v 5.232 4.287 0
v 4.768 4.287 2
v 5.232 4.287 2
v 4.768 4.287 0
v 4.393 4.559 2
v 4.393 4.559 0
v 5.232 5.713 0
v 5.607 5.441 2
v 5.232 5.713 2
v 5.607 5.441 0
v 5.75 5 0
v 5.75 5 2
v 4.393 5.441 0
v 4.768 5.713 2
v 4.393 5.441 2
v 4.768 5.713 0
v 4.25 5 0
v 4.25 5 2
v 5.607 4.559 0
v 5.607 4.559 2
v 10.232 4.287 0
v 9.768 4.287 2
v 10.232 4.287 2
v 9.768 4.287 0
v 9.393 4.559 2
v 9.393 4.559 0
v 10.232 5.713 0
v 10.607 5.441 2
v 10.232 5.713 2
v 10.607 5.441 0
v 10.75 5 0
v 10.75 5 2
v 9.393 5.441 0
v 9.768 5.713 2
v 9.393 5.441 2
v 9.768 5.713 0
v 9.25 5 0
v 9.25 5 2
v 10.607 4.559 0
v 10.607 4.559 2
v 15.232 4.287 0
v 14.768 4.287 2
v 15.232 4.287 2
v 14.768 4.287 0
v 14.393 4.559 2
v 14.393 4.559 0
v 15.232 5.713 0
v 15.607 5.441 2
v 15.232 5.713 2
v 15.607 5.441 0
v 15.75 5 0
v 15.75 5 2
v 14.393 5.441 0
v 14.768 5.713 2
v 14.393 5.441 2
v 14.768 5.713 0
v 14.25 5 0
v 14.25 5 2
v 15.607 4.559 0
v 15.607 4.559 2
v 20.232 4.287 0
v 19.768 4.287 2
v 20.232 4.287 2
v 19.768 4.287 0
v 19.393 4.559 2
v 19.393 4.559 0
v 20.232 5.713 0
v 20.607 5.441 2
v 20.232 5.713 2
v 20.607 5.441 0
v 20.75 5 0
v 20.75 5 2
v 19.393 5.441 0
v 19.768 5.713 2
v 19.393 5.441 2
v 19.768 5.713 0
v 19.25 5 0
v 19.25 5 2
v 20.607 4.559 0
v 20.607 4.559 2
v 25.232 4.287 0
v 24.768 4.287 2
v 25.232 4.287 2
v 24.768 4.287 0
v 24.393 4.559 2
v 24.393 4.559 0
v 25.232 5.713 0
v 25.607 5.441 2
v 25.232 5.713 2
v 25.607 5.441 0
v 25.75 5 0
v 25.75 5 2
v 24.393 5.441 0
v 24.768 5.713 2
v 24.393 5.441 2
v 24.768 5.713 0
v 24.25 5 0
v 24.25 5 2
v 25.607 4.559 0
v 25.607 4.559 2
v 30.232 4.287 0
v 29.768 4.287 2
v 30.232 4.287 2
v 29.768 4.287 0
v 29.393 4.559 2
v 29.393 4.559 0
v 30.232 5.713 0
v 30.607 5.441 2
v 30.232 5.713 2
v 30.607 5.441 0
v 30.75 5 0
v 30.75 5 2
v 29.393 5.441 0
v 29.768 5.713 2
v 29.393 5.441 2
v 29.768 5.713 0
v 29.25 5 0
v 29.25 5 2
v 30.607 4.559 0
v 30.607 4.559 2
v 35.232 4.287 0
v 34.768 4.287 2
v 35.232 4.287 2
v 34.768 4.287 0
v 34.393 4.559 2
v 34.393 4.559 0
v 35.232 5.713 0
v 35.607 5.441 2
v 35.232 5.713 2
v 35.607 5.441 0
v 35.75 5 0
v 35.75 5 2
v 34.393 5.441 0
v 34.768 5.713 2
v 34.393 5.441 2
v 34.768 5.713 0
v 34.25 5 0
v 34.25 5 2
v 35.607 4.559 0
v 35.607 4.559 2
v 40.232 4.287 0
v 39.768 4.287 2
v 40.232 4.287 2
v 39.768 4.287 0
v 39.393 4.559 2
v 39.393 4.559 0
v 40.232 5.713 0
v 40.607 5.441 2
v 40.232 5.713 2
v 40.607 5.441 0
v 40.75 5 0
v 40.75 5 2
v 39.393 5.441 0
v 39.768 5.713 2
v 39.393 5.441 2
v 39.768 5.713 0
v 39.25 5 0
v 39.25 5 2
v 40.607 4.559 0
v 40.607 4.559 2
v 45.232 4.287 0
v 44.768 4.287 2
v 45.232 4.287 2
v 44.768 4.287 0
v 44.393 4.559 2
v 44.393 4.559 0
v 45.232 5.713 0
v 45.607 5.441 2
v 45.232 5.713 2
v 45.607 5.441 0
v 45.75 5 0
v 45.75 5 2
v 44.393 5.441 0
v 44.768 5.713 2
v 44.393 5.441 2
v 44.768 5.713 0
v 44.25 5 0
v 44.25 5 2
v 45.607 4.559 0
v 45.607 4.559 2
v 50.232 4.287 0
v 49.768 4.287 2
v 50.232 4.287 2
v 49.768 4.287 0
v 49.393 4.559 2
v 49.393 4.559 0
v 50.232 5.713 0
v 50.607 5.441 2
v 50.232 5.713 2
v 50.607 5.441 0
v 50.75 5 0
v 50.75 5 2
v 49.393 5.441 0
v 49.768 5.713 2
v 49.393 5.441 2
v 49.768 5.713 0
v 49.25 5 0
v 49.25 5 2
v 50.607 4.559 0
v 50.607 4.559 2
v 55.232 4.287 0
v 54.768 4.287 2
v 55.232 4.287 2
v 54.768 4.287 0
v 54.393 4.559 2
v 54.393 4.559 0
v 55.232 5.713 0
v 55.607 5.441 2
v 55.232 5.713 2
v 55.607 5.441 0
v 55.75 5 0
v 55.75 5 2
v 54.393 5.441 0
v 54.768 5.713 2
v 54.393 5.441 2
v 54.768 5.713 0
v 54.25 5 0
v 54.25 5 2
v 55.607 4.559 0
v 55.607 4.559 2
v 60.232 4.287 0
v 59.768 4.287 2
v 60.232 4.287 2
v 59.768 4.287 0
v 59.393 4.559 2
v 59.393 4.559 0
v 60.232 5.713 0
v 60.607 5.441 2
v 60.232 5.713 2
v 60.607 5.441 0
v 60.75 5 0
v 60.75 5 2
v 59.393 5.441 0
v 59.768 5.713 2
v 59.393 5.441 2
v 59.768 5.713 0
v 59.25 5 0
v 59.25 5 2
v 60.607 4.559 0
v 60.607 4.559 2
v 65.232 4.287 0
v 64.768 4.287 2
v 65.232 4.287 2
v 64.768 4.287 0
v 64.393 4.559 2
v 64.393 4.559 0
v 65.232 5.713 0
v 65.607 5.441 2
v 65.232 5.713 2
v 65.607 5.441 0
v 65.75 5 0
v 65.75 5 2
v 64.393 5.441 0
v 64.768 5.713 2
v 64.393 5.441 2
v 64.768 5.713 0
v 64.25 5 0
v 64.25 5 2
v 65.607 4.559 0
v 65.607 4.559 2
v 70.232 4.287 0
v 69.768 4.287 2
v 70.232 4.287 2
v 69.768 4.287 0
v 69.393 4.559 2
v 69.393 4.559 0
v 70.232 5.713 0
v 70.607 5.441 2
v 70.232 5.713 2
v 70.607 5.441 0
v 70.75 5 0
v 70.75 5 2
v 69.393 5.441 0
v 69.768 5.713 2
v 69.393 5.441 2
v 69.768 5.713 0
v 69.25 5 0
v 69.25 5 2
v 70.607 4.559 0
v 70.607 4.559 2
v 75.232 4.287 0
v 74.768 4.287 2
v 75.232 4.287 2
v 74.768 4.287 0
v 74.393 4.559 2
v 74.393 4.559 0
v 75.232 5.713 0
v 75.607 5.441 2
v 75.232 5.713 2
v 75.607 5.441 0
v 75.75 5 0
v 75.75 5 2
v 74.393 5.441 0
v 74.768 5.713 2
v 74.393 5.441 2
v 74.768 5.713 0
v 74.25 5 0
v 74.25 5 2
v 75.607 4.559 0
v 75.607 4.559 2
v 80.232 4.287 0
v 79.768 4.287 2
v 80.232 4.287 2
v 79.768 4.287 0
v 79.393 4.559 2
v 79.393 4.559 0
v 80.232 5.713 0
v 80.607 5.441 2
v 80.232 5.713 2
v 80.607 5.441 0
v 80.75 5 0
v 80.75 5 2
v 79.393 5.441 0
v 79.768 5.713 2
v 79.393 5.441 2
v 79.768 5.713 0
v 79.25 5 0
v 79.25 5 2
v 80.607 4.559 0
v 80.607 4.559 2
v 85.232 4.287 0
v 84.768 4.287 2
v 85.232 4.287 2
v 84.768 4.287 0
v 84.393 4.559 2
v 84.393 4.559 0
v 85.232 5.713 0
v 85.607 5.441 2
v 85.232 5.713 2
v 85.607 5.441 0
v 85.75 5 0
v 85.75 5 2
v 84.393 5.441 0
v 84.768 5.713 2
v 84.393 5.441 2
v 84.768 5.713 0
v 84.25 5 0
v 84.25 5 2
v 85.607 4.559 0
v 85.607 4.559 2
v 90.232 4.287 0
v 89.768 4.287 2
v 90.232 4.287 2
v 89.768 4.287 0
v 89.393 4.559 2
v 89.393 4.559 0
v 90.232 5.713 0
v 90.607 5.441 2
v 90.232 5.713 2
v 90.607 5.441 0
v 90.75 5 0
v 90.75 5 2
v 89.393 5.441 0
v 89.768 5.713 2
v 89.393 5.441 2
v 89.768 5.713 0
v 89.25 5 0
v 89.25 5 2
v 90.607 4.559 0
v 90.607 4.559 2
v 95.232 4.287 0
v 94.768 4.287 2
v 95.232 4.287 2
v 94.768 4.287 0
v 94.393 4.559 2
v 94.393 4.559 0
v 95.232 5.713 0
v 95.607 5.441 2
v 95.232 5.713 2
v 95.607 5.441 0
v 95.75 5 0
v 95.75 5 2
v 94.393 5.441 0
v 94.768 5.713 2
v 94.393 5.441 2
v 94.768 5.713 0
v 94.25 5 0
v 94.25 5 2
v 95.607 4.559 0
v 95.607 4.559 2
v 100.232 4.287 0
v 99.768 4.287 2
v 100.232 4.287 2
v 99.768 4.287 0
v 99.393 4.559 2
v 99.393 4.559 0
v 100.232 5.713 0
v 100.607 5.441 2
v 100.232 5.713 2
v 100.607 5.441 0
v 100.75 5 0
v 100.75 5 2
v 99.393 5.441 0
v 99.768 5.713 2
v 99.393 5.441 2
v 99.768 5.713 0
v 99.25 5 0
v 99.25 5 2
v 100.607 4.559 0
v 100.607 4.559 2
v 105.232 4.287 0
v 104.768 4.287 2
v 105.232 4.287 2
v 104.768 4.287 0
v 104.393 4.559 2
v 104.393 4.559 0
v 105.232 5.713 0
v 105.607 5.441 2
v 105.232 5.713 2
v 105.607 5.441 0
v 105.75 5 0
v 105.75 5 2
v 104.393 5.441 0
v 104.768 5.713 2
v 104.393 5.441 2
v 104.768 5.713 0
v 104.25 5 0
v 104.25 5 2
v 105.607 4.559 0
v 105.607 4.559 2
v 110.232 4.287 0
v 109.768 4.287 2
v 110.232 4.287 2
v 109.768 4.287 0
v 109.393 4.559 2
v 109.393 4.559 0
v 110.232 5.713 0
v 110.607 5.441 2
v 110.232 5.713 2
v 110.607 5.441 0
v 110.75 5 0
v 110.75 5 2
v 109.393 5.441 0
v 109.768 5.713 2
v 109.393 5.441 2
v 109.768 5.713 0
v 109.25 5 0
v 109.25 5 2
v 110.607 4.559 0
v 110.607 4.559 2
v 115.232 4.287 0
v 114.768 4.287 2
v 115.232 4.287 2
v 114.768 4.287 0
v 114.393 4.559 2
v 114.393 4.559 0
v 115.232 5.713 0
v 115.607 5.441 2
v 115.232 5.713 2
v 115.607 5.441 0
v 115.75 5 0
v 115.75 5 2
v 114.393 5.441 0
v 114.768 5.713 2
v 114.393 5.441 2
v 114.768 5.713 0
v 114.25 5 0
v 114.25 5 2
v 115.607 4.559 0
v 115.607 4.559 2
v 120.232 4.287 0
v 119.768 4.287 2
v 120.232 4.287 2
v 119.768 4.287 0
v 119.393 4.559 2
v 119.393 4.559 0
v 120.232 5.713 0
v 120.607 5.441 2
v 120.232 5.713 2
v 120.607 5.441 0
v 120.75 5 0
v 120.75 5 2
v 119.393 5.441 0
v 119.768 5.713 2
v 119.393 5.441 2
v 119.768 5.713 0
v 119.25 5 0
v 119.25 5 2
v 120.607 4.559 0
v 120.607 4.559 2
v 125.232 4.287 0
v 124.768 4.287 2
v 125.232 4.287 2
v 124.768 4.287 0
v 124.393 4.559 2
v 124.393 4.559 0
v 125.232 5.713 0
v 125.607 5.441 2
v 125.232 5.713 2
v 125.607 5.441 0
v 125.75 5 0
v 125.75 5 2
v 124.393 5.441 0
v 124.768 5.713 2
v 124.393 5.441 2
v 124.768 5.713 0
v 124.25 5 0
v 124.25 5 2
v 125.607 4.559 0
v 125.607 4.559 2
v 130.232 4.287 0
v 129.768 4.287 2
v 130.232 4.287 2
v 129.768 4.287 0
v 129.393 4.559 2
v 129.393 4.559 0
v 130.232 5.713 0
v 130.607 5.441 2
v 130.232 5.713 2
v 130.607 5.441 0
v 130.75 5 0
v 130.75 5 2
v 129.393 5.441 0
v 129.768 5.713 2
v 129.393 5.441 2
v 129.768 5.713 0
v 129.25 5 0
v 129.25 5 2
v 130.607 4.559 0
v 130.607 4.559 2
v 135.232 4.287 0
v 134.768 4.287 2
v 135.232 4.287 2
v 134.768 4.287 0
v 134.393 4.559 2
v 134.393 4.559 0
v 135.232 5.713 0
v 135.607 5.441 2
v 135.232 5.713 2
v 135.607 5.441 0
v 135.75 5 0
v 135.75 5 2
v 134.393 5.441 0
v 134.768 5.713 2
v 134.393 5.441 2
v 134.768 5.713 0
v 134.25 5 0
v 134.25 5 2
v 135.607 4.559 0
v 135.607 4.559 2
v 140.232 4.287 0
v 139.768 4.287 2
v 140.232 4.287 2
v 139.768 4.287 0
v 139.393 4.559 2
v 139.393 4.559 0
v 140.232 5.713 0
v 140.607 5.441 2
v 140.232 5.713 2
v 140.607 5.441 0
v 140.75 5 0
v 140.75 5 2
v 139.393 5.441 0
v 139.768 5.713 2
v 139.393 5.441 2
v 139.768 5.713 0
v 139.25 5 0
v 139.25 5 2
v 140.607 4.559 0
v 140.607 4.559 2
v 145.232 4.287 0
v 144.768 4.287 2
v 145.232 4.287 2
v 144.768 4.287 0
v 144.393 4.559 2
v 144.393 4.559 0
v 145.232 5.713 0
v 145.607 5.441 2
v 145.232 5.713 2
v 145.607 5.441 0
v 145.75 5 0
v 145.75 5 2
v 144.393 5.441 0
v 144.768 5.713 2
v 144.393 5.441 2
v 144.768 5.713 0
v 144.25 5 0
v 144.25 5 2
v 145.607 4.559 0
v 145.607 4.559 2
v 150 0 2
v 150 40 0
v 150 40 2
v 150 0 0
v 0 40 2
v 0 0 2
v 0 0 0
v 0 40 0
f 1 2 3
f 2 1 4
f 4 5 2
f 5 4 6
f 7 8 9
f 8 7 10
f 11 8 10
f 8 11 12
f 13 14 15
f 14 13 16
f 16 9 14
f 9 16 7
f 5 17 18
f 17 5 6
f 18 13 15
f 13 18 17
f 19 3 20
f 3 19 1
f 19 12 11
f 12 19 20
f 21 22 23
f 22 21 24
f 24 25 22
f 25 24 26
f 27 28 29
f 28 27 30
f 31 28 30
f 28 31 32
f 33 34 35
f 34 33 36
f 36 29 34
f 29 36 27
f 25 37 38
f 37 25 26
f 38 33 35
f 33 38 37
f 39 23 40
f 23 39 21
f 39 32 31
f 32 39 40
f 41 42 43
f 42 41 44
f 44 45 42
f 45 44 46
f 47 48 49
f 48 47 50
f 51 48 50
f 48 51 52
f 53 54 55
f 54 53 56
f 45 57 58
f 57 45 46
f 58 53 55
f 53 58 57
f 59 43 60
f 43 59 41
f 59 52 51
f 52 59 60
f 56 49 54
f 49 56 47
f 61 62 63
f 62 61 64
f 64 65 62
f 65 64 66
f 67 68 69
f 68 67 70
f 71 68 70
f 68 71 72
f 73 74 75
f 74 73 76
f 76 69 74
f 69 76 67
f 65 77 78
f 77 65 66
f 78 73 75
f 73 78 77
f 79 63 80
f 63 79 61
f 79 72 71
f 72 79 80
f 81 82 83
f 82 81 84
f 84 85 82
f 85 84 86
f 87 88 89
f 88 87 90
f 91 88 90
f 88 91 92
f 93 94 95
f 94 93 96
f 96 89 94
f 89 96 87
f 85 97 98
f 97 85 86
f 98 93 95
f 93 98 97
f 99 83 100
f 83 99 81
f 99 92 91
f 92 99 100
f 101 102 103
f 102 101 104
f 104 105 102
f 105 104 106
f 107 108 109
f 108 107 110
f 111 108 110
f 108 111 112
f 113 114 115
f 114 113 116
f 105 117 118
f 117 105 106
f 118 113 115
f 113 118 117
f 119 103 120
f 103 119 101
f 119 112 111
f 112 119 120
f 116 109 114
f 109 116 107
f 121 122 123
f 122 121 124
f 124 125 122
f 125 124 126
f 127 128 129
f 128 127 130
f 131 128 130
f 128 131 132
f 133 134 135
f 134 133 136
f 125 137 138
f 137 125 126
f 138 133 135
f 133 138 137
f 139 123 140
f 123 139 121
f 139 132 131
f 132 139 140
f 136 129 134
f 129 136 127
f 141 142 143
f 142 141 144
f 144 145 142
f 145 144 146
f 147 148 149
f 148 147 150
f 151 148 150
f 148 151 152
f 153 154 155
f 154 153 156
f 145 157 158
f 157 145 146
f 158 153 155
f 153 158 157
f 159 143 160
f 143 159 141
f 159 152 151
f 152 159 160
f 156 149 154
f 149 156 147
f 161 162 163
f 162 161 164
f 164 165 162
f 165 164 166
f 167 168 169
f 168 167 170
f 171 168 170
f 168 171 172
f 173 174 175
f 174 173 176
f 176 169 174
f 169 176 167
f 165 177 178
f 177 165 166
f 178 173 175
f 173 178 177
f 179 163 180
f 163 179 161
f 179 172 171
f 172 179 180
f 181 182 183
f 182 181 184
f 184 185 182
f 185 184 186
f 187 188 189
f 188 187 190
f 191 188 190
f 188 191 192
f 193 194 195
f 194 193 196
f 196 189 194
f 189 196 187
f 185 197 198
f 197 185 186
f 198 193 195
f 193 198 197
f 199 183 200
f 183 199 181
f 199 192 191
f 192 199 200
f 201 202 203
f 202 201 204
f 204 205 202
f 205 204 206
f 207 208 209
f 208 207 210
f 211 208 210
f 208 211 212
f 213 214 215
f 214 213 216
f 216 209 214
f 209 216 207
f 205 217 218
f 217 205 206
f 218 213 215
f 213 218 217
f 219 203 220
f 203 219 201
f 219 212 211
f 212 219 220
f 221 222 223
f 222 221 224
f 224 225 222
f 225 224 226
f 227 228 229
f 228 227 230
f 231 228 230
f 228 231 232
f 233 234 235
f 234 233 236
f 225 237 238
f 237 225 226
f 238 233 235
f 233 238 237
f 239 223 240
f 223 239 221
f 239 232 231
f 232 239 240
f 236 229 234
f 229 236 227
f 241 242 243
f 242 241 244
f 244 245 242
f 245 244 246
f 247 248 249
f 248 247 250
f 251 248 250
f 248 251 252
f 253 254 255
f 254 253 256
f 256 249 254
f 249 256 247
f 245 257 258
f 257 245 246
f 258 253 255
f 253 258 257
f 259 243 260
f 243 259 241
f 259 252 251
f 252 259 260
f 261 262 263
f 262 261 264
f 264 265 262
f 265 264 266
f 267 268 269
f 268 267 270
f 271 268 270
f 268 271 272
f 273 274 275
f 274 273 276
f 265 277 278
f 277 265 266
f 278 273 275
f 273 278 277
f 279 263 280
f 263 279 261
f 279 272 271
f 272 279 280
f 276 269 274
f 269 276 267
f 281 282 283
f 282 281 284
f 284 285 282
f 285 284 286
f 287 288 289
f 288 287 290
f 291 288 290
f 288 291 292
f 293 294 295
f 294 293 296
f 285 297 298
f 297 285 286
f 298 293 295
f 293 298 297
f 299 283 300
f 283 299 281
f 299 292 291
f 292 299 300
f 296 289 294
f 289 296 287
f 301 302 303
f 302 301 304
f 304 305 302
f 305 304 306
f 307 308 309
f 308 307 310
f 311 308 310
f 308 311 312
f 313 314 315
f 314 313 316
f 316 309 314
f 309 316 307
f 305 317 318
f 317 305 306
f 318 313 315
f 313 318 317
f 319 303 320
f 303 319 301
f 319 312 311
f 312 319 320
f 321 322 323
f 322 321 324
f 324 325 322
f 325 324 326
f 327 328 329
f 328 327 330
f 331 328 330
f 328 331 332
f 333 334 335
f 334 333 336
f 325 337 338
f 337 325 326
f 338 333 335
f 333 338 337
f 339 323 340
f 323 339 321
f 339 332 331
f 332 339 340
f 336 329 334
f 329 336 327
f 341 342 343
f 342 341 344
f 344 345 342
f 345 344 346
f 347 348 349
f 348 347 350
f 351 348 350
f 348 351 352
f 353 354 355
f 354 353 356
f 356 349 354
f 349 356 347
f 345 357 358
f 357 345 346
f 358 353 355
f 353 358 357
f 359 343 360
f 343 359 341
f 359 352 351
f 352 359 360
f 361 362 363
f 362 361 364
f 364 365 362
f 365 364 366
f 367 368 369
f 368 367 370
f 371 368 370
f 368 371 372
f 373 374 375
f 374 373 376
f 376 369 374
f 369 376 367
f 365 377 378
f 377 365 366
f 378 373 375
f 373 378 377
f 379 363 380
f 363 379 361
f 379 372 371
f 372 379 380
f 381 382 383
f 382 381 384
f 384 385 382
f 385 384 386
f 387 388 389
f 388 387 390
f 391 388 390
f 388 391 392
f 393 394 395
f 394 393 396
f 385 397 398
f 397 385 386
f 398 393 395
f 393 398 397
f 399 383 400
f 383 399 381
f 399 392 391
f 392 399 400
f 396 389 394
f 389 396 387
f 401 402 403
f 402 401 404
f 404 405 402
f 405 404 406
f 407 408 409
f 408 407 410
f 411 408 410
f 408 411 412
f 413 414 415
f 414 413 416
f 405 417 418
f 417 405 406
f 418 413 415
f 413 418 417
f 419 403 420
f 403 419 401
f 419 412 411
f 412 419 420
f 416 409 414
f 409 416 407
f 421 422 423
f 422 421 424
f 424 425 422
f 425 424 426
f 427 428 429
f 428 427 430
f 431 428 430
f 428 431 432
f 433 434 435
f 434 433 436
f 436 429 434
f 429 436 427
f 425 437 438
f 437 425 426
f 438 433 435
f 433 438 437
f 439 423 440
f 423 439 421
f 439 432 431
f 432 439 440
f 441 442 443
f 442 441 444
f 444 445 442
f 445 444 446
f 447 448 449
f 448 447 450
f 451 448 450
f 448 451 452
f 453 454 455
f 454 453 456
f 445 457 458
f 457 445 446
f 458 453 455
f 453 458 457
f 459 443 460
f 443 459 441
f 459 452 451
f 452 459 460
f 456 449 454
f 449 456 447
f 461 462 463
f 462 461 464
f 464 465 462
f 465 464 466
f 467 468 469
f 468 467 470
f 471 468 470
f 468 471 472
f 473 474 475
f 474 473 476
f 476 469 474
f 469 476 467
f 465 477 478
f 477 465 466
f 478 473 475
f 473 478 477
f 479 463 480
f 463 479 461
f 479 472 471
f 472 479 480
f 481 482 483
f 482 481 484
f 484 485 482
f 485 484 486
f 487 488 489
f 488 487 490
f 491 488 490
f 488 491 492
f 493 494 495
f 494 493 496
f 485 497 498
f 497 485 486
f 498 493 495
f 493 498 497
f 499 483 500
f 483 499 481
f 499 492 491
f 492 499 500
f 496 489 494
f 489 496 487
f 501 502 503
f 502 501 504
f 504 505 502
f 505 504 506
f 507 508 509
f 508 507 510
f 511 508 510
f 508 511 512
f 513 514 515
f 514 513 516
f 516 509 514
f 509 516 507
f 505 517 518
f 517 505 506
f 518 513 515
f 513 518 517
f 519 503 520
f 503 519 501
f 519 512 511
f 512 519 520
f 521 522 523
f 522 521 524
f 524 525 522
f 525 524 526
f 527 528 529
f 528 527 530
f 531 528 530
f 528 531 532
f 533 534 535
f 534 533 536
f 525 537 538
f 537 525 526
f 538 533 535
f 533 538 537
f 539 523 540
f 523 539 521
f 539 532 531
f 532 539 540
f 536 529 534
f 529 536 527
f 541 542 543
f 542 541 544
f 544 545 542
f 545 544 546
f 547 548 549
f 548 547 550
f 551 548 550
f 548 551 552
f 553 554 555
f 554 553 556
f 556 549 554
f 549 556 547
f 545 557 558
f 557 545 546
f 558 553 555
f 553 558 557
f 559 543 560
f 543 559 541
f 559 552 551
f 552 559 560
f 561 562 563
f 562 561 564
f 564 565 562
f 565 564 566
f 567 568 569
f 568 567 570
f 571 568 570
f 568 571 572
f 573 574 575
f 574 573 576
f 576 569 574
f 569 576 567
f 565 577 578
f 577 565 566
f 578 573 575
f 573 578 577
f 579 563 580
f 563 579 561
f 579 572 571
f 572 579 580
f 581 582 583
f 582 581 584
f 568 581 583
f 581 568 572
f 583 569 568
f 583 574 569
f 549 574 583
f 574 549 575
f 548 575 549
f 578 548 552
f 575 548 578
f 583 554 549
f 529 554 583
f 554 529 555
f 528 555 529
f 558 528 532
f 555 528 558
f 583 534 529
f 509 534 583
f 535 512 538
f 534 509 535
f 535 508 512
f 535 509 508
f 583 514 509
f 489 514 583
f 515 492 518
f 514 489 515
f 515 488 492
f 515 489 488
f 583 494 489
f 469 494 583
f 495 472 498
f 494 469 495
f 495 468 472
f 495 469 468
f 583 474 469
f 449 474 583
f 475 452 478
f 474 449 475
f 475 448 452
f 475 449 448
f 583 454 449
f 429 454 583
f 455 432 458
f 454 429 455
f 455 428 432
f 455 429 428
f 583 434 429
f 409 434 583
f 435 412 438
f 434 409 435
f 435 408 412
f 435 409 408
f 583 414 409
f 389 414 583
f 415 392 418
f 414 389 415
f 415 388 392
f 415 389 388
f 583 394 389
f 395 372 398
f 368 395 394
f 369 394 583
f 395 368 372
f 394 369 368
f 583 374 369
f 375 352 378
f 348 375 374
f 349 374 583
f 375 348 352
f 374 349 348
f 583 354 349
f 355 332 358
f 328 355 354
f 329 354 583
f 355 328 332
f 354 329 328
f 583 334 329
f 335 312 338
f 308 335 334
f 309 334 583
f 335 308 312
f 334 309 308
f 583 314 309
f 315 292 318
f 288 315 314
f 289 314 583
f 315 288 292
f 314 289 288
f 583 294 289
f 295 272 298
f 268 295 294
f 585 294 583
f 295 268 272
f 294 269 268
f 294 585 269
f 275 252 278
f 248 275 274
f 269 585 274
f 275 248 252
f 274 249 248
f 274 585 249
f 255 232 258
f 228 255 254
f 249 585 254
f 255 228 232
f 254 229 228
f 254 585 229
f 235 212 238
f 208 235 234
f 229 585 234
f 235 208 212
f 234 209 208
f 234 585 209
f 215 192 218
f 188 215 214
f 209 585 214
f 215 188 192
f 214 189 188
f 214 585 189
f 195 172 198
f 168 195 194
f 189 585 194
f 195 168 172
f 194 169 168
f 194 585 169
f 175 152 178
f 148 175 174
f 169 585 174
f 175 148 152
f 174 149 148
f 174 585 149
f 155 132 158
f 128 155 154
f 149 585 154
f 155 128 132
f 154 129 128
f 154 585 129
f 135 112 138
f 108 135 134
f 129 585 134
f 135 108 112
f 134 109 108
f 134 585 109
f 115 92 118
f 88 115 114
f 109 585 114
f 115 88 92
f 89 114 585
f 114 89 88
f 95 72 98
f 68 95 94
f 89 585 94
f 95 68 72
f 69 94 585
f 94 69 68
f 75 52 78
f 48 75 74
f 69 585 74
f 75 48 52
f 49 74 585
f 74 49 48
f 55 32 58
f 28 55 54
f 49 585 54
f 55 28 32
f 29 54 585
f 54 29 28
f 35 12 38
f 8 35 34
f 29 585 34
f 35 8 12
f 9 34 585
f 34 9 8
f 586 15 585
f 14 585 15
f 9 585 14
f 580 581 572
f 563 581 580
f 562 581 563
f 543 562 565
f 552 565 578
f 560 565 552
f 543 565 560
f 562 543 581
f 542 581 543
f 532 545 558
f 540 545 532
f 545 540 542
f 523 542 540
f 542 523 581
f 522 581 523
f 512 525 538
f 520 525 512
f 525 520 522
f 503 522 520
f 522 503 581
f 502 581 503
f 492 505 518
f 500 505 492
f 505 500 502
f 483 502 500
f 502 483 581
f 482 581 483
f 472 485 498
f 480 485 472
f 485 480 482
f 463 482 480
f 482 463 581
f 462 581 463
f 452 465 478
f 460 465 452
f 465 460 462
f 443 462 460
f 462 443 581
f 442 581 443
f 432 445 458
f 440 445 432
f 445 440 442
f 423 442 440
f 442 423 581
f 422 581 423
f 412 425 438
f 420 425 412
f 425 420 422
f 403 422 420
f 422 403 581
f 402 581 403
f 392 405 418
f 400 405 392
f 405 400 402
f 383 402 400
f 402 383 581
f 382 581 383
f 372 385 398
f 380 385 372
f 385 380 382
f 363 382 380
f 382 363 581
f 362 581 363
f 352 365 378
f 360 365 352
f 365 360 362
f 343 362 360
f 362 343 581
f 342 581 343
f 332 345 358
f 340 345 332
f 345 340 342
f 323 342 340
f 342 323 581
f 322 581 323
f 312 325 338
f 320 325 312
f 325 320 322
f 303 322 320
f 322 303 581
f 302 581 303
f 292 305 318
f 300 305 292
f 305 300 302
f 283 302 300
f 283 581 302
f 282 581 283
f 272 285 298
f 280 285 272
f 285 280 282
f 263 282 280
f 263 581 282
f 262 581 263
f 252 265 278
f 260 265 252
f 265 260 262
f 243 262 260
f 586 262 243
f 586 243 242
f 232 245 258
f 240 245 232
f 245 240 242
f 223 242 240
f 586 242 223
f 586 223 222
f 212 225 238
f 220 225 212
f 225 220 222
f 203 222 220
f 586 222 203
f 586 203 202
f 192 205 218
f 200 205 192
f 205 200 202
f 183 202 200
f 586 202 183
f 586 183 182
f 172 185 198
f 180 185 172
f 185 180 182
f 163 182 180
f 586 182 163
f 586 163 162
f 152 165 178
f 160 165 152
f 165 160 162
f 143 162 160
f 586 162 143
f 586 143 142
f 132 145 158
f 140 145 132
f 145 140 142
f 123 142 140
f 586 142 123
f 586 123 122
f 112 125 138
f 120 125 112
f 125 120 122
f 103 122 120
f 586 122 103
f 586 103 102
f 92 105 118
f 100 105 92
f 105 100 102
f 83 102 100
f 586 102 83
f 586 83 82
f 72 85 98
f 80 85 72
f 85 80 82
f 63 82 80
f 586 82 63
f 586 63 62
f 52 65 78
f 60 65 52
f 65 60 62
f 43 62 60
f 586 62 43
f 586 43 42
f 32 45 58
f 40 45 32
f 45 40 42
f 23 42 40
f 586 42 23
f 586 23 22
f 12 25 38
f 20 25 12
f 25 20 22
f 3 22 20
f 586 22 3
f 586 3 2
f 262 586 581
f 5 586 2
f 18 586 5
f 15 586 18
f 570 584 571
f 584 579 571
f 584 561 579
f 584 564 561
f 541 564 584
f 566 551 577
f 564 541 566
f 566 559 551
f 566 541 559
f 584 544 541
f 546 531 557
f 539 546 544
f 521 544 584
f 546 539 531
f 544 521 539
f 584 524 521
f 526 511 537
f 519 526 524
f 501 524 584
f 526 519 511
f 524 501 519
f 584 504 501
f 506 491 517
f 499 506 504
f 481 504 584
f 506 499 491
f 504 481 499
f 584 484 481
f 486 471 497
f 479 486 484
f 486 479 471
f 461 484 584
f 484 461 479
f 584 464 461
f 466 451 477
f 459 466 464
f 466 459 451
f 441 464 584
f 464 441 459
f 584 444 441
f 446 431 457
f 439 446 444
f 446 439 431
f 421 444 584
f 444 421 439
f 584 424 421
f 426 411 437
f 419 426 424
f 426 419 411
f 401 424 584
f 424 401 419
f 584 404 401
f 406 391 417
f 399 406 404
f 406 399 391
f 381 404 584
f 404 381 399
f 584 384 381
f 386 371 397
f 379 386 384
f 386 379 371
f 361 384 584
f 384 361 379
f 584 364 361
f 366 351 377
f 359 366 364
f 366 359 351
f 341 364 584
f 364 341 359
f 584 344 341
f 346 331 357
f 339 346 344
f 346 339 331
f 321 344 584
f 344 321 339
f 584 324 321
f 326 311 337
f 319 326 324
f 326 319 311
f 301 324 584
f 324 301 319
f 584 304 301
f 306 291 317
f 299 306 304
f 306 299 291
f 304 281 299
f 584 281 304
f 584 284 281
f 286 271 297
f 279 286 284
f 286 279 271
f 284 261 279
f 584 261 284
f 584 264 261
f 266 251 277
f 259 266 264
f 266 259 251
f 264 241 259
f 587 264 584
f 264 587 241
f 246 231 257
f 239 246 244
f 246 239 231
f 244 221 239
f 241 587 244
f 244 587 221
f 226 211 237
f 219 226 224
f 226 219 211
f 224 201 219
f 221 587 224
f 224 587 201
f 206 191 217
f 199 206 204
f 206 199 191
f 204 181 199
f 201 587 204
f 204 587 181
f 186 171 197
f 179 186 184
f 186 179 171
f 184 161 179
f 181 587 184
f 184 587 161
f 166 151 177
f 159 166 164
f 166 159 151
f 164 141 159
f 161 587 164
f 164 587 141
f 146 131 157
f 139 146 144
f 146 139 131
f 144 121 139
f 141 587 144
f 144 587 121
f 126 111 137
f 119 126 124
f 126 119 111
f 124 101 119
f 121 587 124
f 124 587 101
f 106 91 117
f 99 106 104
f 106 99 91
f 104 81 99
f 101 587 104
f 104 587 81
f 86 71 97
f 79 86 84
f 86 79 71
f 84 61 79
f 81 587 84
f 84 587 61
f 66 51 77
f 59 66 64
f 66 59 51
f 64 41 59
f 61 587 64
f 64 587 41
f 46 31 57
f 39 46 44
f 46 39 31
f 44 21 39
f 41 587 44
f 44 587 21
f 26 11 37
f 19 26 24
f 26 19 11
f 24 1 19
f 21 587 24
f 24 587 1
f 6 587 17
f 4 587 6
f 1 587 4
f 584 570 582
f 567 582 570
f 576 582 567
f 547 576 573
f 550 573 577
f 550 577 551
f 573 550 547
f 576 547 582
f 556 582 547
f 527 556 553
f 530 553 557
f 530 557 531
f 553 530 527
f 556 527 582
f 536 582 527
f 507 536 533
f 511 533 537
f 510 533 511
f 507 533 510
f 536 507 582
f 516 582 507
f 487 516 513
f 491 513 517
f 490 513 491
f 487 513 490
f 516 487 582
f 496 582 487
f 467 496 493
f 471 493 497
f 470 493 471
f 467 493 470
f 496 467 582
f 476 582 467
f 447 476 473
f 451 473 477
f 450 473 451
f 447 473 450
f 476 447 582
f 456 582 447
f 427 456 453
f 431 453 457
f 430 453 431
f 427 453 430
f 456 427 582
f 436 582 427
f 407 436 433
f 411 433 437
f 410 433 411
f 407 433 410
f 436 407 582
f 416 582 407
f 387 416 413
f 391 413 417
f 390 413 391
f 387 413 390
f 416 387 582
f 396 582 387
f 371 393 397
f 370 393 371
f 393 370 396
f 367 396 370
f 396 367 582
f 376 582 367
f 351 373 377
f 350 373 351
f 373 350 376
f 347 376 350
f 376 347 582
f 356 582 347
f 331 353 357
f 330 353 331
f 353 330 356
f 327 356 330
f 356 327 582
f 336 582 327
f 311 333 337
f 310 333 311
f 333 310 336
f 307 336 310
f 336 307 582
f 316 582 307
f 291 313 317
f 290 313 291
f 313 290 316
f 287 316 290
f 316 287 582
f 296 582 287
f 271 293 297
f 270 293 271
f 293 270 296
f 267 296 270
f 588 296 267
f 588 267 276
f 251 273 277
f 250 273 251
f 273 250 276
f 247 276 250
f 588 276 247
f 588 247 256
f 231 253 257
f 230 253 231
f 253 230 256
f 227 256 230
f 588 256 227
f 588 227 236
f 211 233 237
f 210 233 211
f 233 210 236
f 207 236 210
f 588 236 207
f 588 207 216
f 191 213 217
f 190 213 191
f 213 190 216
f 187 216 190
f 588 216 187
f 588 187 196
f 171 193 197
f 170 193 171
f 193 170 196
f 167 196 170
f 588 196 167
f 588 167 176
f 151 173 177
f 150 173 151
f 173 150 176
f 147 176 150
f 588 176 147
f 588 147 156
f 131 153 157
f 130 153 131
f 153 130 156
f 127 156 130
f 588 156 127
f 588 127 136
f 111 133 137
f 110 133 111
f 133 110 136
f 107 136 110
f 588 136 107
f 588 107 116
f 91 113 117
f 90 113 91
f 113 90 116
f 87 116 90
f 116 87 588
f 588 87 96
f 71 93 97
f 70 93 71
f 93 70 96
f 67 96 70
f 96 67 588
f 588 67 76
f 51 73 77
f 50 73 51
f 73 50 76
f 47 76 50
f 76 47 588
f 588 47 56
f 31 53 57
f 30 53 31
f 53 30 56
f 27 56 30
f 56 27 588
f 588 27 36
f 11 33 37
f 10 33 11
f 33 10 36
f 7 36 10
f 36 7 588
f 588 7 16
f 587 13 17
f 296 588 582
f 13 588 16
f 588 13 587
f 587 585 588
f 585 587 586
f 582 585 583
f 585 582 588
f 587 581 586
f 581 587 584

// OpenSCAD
$fn=10;

holes=10;
hole_size=1.5;
allowance=5;

difference() {
    cube([150,40,2]);

    for(i=[5:5:150-1])
    translate([i,5,-1])
    cylinder(4, d=hole_size);
}
